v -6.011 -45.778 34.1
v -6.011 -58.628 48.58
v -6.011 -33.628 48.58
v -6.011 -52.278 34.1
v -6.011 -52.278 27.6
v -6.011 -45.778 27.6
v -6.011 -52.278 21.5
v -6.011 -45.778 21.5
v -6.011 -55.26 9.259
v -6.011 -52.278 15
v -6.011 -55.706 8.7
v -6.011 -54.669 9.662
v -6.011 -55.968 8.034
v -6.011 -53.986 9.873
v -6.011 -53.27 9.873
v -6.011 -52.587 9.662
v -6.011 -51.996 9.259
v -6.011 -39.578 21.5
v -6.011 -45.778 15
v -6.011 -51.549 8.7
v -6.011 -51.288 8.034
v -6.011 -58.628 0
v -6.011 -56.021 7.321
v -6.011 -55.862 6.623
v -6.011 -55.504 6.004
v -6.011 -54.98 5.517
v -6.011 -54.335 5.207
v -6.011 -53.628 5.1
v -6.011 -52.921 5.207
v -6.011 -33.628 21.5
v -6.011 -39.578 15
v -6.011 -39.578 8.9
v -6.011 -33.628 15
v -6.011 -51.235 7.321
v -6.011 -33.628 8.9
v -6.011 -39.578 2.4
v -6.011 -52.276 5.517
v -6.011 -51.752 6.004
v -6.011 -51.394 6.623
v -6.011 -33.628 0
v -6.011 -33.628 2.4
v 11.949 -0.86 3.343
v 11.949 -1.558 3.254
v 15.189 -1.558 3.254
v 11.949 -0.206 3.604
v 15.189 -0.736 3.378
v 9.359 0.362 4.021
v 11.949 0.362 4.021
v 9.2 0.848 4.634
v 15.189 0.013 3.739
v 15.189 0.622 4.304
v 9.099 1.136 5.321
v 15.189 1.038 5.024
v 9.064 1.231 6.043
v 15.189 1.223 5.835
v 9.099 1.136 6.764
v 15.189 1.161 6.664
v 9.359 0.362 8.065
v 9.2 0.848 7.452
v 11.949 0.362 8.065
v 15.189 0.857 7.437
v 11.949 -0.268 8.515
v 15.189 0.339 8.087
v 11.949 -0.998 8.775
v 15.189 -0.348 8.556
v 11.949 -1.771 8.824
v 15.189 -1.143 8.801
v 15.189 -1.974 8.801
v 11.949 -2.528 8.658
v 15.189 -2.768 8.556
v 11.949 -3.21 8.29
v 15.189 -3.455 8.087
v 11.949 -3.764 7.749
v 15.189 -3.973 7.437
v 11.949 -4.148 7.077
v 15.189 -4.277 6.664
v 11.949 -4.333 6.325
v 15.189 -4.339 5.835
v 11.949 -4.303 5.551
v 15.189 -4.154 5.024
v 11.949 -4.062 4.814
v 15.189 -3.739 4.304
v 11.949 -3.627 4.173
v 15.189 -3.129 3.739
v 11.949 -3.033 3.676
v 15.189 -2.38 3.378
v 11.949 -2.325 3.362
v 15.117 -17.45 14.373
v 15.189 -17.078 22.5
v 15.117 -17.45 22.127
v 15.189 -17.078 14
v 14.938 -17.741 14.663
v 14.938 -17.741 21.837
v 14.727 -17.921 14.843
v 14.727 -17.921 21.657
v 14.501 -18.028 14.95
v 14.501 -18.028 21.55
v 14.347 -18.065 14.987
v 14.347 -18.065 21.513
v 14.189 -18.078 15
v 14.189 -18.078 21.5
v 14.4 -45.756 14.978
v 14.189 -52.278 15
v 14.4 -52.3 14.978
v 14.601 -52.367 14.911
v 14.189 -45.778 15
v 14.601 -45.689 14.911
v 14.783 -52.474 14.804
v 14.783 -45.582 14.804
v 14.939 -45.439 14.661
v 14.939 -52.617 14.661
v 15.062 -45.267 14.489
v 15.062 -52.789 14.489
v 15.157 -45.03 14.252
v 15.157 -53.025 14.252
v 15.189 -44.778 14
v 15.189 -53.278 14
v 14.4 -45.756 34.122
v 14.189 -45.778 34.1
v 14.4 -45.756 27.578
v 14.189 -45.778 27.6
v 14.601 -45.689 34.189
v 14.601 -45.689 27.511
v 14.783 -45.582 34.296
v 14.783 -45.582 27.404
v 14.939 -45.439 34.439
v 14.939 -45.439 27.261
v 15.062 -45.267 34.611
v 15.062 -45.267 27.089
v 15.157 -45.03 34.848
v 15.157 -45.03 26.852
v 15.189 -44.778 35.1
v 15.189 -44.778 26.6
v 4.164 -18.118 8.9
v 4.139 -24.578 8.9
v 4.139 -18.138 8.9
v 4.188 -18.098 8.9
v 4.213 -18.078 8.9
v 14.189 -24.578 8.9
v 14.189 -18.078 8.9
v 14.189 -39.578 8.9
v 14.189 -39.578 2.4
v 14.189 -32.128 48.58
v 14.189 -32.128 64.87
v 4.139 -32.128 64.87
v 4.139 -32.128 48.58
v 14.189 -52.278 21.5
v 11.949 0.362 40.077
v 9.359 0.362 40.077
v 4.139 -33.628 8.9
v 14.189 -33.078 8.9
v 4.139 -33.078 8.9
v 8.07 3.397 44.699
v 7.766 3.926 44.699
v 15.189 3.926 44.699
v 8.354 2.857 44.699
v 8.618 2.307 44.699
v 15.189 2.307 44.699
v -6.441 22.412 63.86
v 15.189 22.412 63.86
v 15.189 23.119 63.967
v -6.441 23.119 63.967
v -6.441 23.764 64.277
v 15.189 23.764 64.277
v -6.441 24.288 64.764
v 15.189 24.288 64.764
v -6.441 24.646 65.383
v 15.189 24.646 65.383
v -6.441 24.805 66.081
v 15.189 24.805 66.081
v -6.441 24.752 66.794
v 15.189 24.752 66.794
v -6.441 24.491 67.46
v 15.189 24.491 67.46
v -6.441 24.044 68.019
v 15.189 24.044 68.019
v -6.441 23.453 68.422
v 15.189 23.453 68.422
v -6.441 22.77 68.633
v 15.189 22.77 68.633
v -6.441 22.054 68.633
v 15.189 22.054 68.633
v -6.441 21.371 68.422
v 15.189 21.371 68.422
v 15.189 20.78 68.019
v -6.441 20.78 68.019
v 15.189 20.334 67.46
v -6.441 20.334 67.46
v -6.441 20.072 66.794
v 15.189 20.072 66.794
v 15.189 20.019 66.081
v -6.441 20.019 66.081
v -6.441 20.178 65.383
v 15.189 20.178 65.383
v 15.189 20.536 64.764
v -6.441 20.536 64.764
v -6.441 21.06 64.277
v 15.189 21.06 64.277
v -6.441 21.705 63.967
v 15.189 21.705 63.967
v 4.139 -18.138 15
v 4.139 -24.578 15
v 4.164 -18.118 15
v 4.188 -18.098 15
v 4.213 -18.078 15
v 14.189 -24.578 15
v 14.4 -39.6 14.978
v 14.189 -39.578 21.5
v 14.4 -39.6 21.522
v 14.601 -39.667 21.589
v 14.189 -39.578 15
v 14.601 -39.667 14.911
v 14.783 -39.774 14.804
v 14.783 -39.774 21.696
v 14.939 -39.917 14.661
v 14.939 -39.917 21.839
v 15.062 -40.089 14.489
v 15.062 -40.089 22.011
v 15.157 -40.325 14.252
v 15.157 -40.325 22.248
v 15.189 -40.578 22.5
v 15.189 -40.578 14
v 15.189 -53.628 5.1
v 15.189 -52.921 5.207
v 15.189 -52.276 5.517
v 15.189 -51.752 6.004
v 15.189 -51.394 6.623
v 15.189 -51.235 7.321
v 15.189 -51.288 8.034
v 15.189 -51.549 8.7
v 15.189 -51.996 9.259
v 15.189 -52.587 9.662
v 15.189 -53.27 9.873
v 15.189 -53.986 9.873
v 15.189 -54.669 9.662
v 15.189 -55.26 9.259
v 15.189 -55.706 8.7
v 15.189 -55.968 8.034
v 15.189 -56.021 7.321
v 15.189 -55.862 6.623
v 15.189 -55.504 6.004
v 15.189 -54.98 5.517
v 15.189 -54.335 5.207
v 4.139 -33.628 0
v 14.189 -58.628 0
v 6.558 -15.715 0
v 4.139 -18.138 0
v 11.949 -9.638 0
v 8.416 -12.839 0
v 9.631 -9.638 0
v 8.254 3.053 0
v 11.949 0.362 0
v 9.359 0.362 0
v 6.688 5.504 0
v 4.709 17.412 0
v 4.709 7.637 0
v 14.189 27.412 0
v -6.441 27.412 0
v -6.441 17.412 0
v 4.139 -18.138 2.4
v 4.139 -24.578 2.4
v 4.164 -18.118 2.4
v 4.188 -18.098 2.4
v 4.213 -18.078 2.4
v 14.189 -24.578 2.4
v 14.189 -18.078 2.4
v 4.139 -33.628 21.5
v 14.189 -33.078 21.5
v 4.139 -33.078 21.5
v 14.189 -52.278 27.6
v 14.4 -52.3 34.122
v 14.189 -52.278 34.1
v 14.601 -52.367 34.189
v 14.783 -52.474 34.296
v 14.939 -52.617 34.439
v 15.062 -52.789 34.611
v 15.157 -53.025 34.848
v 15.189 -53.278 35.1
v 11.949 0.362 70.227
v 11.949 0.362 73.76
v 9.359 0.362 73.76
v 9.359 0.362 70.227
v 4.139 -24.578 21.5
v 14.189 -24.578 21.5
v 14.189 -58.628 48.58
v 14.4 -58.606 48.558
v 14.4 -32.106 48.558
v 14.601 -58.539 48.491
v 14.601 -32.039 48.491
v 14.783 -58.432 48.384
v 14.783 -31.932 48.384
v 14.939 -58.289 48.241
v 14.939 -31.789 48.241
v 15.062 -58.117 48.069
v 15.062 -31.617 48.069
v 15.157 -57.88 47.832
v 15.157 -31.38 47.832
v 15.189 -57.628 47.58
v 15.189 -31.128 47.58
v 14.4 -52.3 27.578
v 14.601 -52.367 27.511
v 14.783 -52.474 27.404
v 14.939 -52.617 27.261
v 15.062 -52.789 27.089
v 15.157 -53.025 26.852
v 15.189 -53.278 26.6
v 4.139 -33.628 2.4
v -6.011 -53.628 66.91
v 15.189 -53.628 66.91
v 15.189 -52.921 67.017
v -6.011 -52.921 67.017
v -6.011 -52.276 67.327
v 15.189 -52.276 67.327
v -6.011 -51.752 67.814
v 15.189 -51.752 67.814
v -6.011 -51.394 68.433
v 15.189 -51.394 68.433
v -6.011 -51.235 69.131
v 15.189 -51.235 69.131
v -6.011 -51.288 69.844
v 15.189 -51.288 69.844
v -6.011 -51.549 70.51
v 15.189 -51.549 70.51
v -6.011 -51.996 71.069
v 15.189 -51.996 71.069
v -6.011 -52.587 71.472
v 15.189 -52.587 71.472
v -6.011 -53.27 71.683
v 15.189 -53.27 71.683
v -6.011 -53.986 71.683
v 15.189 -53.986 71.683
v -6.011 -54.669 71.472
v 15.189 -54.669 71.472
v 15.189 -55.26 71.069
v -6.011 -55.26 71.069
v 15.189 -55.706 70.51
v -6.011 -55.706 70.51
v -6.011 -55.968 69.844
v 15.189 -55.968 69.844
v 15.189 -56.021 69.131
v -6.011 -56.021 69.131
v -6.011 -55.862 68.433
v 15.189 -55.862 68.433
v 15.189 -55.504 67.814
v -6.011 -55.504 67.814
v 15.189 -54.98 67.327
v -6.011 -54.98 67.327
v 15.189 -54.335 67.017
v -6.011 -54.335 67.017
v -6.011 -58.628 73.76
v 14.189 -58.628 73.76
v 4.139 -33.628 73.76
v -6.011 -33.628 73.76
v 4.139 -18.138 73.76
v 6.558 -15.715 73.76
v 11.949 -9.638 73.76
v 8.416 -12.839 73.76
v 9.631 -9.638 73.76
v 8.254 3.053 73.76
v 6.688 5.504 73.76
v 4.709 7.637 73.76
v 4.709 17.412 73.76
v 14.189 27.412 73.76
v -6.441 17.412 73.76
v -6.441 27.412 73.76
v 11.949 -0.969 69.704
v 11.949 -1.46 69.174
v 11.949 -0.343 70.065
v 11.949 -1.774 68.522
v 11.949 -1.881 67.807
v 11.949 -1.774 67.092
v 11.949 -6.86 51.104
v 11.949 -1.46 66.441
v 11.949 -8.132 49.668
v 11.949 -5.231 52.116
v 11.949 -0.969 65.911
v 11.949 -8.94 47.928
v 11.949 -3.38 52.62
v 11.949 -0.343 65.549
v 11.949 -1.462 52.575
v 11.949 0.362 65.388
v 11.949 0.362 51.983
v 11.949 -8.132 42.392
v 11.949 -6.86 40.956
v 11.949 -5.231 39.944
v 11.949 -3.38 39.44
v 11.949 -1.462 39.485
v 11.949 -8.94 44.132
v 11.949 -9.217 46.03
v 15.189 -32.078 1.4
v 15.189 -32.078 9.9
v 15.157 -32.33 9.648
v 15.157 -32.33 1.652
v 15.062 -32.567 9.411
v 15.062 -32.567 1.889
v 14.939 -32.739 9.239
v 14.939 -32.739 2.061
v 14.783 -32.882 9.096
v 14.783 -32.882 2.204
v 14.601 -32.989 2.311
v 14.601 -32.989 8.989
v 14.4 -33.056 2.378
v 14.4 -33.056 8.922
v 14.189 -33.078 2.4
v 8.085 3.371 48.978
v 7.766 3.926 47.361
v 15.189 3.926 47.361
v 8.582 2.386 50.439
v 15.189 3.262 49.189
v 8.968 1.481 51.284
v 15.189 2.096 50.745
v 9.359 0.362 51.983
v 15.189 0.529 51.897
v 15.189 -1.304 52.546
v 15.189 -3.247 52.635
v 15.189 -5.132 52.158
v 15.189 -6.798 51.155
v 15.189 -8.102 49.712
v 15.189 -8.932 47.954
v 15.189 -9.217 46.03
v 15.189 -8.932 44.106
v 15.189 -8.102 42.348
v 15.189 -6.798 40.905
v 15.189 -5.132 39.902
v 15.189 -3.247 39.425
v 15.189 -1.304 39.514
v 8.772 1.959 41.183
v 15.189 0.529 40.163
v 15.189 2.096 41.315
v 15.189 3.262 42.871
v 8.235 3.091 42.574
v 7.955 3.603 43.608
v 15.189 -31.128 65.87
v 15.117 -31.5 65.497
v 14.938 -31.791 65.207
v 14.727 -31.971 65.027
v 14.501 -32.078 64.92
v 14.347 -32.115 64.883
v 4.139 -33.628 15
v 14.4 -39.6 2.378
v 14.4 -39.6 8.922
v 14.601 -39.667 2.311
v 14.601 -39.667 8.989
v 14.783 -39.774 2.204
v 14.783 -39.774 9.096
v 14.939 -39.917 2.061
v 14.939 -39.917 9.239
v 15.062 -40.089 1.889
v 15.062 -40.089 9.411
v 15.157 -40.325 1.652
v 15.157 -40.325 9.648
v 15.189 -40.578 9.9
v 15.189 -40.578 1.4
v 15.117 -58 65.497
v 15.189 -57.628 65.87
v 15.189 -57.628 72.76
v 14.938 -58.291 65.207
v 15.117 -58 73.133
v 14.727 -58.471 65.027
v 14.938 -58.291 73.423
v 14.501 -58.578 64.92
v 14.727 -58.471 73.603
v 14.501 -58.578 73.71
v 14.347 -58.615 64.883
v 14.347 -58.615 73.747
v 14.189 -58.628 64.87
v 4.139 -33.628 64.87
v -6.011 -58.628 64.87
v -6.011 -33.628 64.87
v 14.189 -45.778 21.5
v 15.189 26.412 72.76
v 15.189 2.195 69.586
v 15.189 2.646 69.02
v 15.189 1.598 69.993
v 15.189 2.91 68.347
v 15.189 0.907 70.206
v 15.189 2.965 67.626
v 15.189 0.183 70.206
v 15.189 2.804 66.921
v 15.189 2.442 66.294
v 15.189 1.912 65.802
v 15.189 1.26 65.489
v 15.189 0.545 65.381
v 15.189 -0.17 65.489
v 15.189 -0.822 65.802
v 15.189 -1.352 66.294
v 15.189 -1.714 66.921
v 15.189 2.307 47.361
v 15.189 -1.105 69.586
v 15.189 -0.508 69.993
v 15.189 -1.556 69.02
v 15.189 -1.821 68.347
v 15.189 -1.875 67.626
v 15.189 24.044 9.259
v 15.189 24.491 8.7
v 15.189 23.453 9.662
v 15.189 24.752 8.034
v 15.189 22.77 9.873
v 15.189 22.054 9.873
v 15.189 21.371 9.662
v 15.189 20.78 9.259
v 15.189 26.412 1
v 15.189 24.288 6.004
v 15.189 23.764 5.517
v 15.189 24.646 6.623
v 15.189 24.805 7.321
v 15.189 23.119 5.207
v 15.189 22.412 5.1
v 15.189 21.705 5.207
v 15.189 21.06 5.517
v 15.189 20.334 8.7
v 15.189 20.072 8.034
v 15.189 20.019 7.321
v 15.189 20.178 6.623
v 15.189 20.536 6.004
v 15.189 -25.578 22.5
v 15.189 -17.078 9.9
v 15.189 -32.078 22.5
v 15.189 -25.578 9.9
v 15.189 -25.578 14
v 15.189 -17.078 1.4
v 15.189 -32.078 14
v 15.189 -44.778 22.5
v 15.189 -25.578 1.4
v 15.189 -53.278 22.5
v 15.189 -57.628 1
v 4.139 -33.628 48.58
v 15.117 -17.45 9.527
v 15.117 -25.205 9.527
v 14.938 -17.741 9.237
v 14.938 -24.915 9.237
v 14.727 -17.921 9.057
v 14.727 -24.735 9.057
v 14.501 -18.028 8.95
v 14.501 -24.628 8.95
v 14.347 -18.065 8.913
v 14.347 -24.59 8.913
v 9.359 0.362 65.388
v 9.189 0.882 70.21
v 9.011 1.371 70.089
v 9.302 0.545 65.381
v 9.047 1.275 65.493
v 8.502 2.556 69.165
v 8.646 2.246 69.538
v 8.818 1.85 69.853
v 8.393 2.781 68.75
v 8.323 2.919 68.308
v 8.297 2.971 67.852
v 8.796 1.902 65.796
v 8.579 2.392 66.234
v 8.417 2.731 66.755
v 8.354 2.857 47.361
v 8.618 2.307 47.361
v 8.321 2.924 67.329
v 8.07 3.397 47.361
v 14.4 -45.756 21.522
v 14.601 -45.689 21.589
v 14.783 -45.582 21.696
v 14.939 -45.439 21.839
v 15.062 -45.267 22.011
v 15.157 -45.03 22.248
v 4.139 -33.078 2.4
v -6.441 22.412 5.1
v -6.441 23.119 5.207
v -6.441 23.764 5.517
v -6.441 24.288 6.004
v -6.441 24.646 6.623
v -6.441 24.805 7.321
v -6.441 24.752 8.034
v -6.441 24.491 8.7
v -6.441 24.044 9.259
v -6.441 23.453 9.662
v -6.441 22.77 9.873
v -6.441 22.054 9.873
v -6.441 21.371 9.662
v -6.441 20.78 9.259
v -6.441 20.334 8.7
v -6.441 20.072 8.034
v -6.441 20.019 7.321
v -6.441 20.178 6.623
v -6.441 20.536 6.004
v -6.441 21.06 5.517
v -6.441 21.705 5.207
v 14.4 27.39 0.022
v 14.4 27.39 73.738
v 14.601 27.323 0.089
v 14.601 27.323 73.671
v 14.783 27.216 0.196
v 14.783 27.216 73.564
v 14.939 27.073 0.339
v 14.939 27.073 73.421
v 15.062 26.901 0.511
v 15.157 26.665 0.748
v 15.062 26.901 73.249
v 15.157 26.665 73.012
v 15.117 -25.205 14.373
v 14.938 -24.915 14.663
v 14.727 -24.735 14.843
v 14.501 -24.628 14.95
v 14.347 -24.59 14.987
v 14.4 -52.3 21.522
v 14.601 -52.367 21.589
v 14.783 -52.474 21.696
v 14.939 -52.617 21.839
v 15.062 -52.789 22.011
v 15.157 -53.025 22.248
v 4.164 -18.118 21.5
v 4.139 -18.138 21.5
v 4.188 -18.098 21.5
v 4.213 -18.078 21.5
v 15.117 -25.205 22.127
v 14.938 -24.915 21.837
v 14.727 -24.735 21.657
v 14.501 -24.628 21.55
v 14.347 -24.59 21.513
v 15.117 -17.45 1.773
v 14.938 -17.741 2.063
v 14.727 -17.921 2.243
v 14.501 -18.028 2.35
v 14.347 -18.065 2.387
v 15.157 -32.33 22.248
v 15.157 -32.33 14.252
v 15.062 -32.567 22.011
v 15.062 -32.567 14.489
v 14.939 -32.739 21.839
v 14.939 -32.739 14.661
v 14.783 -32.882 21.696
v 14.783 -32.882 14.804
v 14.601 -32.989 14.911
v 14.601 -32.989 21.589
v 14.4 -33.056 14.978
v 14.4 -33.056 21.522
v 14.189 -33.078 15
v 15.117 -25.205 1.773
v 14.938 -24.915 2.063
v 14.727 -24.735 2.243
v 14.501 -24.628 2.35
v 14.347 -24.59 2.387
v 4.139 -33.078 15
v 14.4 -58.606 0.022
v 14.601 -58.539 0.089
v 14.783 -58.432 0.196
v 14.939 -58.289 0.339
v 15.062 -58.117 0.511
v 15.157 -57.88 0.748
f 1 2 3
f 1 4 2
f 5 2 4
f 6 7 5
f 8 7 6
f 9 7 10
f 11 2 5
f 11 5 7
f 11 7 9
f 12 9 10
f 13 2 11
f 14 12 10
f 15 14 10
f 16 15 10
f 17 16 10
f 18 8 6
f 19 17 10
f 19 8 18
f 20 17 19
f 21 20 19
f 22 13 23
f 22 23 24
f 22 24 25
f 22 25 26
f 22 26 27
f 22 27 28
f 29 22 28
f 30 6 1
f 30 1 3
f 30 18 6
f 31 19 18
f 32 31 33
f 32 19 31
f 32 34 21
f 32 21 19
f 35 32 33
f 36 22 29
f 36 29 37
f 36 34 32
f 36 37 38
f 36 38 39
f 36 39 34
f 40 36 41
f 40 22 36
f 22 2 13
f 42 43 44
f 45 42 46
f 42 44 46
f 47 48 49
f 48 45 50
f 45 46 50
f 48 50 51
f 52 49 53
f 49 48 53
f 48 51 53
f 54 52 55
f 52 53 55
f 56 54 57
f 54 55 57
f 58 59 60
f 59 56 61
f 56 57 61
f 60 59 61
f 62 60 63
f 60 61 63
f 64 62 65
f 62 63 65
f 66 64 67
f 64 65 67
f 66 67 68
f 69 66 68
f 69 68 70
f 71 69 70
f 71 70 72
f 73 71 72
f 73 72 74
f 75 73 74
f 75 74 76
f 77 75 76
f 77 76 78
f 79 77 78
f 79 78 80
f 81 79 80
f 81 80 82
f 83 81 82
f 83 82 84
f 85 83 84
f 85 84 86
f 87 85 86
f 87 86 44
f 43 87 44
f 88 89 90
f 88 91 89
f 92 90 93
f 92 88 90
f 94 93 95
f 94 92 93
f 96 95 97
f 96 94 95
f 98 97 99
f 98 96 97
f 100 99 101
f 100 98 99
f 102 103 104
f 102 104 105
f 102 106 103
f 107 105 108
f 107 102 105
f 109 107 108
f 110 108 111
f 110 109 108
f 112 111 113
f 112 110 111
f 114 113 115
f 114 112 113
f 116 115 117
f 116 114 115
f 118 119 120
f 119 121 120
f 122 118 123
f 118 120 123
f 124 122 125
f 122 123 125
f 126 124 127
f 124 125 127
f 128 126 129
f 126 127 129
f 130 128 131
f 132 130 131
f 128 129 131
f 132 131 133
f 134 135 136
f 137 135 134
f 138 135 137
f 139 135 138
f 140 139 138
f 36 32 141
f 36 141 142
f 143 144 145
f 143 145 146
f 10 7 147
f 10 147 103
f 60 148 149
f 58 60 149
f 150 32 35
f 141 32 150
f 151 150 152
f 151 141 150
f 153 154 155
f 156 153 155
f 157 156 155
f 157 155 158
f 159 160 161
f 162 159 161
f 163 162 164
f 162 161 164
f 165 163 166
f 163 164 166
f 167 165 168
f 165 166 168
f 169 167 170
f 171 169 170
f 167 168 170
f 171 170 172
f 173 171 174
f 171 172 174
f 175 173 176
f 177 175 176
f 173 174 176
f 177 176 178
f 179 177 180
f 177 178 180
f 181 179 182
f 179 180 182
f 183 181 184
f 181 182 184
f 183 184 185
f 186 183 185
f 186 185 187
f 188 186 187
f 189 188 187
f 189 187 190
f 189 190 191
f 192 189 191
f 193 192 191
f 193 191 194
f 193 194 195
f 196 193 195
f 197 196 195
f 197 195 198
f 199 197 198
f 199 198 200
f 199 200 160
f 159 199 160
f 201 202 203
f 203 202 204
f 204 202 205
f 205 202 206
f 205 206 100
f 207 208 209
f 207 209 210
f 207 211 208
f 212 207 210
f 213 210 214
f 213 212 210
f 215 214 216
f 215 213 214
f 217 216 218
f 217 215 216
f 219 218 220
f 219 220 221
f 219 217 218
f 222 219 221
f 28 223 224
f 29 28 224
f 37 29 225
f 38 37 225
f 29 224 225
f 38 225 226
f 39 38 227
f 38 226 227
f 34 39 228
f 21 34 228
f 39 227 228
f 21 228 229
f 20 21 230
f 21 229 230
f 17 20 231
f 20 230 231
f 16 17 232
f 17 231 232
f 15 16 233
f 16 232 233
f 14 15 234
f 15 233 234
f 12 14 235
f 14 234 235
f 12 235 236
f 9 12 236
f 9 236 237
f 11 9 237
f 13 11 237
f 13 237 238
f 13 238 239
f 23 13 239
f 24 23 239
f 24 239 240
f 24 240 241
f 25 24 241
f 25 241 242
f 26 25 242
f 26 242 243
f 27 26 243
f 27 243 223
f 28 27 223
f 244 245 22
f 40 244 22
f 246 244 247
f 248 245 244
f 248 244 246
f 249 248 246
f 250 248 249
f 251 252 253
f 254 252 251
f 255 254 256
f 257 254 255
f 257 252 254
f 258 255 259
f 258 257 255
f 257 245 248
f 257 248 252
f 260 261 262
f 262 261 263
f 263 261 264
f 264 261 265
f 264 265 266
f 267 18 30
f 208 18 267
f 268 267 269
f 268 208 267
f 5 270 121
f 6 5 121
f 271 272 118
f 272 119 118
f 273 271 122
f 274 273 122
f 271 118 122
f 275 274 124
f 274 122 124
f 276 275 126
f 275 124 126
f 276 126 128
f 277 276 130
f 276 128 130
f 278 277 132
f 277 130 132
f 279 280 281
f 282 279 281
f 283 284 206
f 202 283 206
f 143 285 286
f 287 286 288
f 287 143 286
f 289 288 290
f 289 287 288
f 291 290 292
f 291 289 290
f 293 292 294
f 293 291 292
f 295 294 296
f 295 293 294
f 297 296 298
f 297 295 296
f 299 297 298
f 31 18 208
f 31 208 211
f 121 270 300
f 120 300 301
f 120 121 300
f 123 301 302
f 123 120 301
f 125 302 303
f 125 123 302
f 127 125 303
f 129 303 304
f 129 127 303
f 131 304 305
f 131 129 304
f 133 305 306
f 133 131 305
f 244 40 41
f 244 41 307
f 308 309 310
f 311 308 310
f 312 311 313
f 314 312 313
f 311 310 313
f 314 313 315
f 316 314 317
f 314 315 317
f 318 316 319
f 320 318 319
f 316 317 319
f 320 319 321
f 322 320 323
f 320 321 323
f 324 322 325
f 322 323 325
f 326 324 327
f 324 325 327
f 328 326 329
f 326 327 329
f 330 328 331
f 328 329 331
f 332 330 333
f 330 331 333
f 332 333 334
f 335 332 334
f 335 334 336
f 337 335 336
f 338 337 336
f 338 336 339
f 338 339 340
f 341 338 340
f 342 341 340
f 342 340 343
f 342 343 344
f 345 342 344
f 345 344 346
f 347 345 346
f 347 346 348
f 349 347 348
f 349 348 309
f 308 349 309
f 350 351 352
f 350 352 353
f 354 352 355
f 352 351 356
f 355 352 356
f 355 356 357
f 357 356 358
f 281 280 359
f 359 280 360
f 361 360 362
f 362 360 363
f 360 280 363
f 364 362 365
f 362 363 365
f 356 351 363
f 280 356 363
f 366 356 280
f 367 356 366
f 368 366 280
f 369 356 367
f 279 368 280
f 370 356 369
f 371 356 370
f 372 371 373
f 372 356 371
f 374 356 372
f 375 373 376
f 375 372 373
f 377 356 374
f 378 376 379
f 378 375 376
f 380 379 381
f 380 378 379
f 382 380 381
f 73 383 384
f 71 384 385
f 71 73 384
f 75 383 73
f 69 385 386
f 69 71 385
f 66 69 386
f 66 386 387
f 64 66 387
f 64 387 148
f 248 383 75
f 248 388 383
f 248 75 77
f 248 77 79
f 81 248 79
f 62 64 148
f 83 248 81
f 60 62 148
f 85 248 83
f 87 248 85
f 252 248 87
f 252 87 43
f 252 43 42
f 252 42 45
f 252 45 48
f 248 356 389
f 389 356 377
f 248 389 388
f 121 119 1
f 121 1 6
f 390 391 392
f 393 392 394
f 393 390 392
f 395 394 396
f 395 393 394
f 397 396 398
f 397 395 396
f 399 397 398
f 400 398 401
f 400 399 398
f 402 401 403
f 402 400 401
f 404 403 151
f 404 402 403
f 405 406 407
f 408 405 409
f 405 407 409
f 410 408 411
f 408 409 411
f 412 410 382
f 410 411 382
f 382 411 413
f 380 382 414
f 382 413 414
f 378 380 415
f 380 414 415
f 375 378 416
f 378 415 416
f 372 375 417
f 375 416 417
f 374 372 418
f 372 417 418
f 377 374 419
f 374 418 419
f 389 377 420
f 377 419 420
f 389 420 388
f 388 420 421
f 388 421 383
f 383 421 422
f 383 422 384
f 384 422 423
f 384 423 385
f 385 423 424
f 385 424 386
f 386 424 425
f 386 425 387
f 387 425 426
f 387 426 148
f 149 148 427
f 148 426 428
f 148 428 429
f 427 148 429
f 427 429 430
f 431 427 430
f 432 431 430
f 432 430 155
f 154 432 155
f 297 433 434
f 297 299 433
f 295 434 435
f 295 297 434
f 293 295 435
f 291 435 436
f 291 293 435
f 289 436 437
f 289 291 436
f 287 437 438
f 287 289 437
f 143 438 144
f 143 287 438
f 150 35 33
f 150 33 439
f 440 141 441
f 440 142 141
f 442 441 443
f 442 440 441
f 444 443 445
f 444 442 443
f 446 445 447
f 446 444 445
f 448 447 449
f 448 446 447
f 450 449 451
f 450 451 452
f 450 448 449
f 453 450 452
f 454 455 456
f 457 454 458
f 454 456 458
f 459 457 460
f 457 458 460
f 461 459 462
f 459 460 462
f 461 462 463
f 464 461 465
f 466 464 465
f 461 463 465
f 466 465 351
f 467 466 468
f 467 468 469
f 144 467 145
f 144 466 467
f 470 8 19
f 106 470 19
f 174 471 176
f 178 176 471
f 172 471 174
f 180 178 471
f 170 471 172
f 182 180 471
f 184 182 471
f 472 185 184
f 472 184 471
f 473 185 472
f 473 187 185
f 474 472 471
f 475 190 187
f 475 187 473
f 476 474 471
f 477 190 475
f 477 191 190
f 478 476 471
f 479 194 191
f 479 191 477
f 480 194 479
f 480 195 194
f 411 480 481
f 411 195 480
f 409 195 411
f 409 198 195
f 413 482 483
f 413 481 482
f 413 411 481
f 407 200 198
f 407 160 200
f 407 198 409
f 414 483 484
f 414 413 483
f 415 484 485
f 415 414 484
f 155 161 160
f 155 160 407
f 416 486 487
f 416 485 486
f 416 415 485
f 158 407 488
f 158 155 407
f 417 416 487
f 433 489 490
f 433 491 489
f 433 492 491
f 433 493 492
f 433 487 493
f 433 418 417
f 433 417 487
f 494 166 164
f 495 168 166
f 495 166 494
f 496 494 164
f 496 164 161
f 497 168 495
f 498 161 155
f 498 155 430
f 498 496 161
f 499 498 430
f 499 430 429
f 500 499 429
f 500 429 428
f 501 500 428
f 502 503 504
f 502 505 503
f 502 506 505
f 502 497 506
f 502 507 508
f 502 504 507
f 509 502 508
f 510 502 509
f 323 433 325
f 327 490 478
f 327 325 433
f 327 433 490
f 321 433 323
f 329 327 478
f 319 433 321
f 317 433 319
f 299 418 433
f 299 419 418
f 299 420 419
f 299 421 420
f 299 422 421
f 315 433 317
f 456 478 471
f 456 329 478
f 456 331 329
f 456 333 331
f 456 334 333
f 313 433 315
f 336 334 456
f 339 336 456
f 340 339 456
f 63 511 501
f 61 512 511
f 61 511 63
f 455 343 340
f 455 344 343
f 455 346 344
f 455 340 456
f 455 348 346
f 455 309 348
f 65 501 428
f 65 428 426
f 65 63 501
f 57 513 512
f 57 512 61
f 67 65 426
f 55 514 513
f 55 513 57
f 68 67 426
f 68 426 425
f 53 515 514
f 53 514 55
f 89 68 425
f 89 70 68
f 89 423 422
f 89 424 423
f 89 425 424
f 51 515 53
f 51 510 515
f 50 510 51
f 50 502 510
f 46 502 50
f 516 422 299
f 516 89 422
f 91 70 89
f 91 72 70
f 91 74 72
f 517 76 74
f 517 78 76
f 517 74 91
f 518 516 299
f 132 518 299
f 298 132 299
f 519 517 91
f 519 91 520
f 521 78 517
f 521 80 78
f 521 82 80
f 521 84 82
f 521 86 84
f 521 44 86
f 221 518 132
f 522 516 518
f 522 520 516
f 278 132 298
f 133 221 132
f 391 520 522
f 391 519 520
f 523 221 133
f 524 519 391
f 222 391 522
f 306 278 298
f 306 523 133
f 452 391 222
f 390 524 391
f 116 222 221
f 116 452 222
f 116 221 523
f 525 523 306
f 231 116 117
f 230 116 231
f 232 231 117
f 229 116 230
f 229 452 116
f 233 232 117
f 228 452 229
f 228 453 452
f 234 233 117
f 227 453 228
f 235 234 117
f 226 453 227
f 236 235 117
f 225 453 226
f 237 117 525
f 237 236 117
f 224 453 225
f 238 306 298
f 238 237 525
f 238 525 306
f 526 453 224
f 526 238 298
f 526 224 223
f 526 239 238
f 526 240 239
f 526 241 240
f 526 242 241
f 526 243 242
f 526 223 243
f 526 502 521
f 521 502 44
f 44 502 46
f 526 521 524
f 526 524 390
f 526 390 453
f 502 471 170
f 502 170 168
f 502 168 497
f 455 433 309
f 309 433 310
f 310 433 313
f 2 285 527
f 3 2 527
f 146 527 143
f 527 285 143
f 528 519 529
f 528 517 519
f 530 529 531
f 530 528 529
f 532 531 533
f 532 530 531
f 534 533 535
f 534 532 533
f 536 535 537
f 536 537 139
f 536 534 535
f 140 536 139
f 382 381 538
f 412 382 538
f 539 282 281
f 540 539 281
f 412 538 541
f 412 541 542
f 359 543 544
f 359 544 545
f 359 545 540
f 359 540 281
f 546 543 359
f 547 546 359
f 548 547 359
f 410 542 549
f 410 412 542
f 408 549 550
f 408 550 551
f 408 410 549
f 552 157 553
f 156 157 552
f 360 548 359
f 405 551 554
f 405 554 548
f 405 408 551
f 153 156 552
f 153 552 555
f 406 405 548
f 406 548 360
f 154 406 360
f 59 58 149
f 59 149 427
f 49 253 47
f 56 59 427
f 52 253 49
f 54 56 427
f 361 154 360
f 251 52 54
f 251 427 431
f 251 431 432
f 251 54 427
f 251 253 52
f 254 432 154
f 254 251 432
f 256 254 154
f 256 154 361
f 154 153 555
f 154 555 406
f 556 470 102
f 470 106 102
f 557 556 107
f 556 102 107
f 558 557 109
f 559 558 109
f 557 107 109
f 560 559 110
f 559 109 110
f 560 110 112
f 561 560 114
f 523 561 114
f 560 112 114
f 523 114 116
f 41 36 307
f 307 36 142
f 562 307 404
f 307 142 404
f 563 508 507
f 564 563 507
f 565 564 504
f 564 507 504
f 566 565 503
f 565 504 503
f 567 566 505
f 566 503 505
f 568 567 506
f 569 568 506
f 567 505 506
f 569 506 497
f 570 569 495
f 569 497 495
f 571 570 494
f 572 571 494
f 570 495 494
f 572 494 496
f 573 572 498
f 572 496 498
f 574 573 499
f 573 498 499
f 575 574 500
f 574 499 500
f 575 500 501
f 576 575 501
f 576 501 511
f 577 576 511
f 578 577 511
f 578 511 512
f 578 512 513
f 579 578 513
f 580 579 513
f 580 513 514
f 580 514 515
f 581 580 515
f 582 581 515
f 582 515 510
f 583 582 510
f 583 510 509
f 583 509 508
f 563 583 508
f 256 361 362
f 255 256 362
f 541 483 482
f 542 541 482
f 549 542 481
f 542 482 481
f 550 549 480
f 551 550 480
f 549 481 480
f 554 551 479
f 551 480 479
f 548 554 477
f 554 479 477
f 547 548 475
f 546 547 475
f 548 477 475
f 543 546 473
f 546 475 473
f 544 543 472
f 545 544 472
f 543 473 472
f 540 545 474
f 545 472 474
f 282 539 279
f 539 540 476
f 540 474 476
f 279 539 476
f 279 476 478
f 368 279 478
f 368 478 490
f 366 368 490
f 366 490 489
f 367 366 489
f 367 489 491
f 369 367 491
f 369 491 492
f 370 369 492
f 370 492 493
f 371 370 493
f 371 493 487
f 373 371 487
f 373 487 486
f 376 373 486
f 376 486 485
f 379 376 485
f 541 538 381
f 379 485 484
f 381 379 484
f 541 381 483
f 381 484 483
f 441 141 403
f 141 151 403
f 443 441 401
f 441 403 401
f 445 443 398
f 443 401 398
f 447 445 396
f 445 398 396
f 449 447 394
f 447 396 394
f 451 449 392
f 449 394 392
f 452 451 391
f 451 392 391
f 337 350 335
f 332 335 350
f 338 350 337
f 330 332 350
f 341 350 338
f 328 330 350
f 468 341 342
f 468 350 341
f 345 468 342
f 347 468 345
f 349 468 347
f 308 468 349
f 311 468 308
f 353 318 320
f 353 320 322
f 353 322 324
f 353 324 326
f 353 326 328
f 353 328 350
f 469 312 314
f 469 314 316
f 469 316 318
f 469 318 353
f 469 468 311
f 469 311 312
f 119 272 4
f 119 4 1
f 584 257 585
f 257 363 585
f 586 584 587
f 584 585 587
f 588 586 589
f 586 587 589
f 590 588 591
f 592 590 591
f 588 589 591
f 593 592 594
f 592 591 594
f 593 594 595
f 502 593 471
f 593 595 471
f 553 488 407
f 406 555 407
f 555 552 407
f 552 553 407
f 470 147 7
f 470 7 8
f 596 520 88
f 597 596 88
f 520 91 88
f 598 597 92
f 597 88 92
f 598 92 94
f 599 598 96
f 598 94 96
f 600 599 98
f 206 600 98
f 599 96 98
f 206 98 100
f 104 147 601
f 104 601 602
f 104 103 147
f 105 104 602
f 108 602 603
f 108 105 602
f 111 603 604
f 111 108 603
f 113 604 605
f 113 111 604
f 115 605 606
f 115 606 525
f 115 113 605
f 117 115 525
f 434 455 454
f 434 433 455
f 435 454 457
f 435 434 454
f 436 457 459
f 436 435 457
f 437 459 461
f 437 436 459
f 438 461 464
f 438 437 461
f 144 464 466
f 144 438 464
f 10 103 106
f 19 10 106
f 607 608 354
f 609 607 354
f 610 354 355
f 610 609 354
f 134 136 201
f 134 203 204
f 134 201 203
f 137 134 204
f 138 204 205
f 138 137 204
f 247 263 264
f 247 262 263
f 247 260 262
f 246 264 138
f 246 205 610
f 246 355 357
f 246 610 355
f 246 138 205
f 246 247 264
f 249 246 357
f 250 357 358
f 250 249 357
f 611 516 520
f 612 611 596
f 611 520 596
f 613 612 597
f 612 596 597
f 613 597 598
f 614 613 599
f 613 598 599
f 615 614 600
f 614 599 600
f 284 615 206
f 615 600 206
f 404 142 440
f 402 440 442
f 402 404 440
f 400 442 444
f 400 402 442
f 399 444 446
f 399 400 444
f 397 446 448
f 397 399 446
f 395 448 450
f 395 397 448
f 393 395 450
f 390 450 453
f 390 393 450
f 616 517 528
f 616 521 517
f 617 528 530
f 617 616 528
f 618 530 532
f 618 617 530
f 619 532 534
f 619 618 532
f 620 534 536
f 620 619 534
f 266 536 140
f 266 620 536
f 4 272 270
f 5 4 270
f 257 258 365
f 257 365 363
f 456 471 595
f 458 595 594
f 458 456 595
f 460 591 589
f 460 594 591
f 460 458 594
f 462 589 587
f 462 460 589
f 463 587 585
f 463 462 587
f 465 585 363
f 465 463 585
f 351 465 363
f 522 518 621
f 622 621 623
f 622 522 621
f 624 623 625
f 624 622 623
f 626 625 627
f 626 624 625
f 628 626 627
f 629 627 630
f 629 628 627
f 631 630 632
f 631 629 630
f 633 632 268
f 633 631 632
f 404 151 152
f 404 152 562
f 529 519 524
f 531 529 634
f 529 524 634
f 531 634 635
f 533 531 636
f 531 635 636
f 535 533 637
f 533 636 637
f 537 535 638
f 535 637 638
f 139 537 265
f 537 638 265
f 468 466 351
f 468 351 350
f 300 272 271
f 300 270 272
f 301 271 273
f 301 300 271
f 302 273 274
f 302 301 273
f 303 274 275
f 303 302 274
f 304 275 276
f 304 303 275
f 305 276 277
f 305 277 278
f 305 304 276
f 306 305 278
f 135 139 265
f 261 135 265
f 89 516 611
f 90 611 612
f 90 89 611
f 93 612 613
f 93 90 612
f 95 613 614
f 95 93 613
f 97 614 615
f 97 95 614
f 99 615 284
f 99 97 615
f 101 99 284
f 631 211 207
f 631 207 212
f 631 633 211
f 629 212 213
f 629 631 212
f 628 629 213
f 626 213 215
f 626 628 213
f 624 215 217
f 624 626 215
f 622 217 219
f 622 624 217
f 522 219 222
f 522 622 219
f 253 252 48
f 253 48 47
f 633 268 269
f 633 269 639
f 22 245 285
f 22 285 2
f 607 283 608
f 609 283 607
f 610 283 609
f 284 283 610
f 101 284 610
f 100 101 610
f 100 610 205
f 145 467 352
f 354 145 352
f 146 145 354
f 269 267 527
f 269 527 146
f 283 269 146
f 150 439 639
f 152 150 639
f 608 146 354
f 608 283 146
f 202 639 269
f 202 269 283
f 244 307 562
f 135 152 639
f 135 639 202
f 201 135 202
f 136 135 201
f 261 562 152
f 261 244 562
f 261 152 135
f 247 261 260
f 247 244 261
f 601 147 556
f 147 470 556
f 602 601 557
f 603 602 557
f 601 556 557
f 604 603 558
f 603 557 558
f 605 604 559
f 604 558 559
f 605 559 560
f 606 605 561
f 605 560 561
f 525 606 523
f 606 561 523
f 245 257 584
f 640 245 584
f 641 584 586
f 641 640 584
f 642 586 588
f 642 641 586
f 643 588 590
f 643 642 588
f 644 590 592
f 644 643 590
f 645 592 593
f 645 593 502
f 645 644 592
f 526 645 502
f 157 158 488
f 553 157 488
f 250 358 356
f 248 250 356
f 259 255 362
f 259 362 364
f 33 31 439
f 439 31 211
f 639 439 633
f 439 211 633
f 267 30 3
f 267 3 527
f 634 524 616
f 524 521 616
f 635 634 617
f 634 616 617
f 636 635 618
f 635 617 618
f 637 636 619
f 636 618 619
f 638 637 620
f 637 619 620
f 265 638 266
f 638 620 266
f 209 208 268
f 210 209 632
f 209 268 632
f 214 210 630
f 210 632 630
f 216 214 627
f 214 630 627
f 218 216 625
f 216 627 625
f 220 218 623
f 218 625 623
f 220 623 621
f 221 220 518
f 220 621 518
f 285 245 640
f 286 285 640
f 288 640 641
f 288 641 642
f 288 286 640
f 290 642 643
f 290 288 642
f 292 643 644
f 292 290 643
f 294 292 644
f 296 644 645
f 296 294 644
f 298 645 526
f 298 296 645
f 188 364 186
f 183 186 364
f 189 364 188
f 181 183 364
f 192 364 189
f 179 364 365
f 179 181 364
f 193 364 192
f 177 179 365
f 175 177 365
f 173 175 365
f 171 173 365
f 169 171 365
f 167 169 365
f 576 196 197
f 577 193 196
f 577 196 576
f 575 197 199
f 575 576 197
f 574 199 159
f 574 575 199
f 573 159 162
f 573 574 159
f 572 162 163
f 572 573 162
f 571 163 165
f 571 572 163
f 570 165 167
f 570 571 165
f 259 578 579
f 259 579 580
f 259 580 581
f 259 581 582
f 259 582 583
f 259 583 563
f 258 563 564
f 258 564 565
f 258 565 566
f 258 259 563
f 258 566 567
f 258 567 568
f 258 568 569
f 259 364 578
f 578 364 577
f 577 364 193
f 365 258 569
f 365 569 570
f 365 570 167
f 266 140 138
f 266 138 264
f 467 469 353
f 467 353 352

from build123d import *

# Parameters (mm, degrees)
PROFILEEXTRUDE_DEPTH = 73.76
HOSEWINDOW_W         = 16.29
HOSEWINDOW_H         = 26.5
HOSEWINDOWCUT_DEPTH  = 22.63
CAGESCREWS_R         = 2.4
CAGESCREWSCUT_DEPTH  = 22.63
AXLEHOLECUT_DEPTH    = 22.63
SETSCREWS_R          = 2.426338021
SETSCREWS_R_2        = 2.788762315
SETSCREWSCUT_DEPTH   = 22.63
SKETCH1_W            = 6.5
SKETCH1_H            = 6.5
CUT_EXTRUDE1_DEPTH   = 22.63
FILLET1_R            = 1


with BuildPart() as part:
    # Profile → ProfileExtrude (new body)
    with BuildSketch(Plane.XY):
        with BuildLine():
            Line((-6.01073477, -58.62791746), (-6.01073477, -33.62791746))
            Line((-6.01073477, -33.62791746), (4.13926523, -33.62791746))
            Line((4.13926523, -33.62791746), (4.13926523, -18.13791746))
            ThreePointArc((4.13926523, -18.13791746), (7.563334043, -14.326029686), (9.63126523, -9.63791746))
            Line((9.63126523, -9.63791746), (11.94926523, -9.63791746))
            Line((11.94926523, -9.63791746), (11.94926523, 0.36208254))
            Line((11.94926523, 0.36208254), (9.35926523, 0.36208254))
            ThreePointArc((9.35926523, 0.36208254), (7.525939238, 4.313848402), (4.70926523, 7.63708254))
            Line((4.70926523, 7.63708254), (4.70926523, 17.41208254))
            Line((4.70926523, 17.41208254), (-6.44073477, 17.41208254))
            Line((-6.44073477, 17.41208254), (-6.44073477, 27.41208254))
            Line((-6.44073477, 27.41208254), (15.18926523, 27.41208254))
            Line((15.18926523, 27.41208254), (15.18926523, -58.62791746))
            Line((15.18926523, -58.62791746), (-6.01073477, -58.62791746))
        make_face()
    extrude(amount=PROFILEEXTRUDE_DEPTH)

    # HoseWindow → HoseWindowCut (cut, through all)
    with BuildSketch(Plane(origin=(15.18926523, 0, 0), x_dir=(0, 0, -1), z_dir=(1, 0, 0))):
        with Locations((-56.725, -45.37791746)):
            Rectangle(HOSEWINDOW_W, HOSEWINDOW_H)
    extrude(amount=-HOSEWINDOWCUT_DEPTH, mode=Mode.SUBTRACT)

    # CageScrews → CageScrewsCut (cut, through all)
    with BuildSketch(Plane(origin=(15.18926523, 0, 0), x_dir=(0, 0, -1), z_dir=(1, 0, 0))):
        with Locations((-66.26, 22.41208254)):
            Circle(CAGESCREWS_R)
        with Locations((-7.5, 22.41208254)):
            Circle(CAGESCREWS_R)
        with Locations((-7.5, -53.62791746)):
            Circle(CAGESCREWS_R)
        with Locations((-69.31, -53.62791746)):
            Circle(CAGESCREWS_R)
    extrude(amount=-CAGESCREWSCUT_DEPTH, mode=Mode.SUBTRACT)

    # AxleHole → AxleHoleCut (cut, through all)
    with BuildSketch(Plane(origin=(15.18926523, 0, 0), x_dir=(0, 0, -1), z_dir=(1, 0, 0))):
        with BuildLine():
            Line((-44.699, 2.307293484), (-47.361, 2.307293484))
            Line((-47.361, 2.307293484), (-47.361, 3.926293484))
            ThreePointArc((-47.361, 3.926293484), (-46.03, -9.21691746), (-44.699, 3.926293484))
            Line((-44.699, 3.926293484), (-44.699, 2.307293484))
        make_face()
    extrude(amount=-AXLEHOLECUT_DEPTH, mode=Mode.SUBTRACT)

    # SetScrews → SetScrewsCut (cut, through all)
    with BuildSketch(Plane(origin=(15.18926523, 0, 0), x_dir=(0, 0, -1), z_dir=(1, 0, 0))):
        with Locations((-67.80722939, 0.544946624)):
            Circle(SETSCREWS_R)
        with Locations((-6.04299884, -1.55824191)):
            Circle(SETSCREWS_R_2)
    extrude(amount=-SETSCREWSCUT_DEPTH, mode=Mode.SUBTRACT)

    # Sketch1 → Cut-Extrude1 (cut, through all)
    with BuildSketch(Plane(origin=(15.18926523, 0, 0), x_dir=(0, 0, -1), z_dir=(1, 0, 0))):
        with Locations((-18.25, -49.02791746)):
            Rectangle(SKETCH1_W, SKETCH1_H)
        with Locations((-30.85, -49.02791746)):
            Rectangle(SKETCH1_W, SKETCH1_H)
        with Locations((-5.65, -36.32791746)):
            Rectangle(SKETCH1_W, SKETCH1_H)
        with Locations((-18.25, -36.32791746)):
            Rectangle(SKETCH1_W, SKETCH1_H)
        with Locations((-5.65, -21.32791746)):
            Rectangle(SKETCH1_W, SKETCH1_H)
        with Locations((-18.25, -21.32791746)):
            Rectangle(SKETCH1_W, SKETCH1_H)
    extrude(amount=-CUT_EXTRUDE1_DEPTH, mode=Mode.SUBTRACT)

    # Fillet1
    fillet1_edges = [part.edges().sort_by_distance(p)[0] for p in [
        (15.18926523, -45.77791746, 18.25),
        (15.18926523, -49.02791746, 21.5),
        (15.18926523, -52.27791746, 18.25),
        (15.18926523, -49.02791746, 15),
        (15.18926523, -49.02791746, 34.1),
        (15.18926523, -52.27791746, 30.85),
        (15.18926523, -49.02791746, 27.6),
        (15.18926523, -45.77791746, 30.85),
        (15.18926523, -36.32791746, 8.9),
        (15.18926523, -39.57791746, 5.65),
        (15.18926523, -36.32791746, 2.4),
        (15.18926523, -33.07791746, 5.65),
        (15.18926523, -15.60791746, 0),
        (15.18926523, -36.32791746, 21.5),
        (15.18926523, -39.57791746, 18.25),
        (15.18926523, -36.32791746, 15),
        (15.18926523, -33.07791746, 18.25),
        (15.18926523, -21.32791746, 8.9),
        (15.18926523, -24.57791746, 5.65),
        (15.18926523, -21.32791746, 2.4),
        (15.18926523, -18.07791746, 5.65),
        (15.18926523, -58.62791746, 69.315),
        (15.18926523, -21.32791746, 21.5),
        (15.18926523, -24.57791746, 18.25),
        (15.18926523, -21.32791746, 15),
        (15.18926523, -18.07791746, 18.25),
        (15.18926523, 27.41208254, 36.88),
        (15.18926523, -58.62791746, 24.29),
        (15.18926523, -15.60791746, 73.76),
        (15.18926523, -45.37791746, 64.87),
        (15.18926523, -45.37791746, 48.58),
        (15.18926523, -32.12791746, 56.725),
    ]]
    fillet(fillet1_edges, radius=FILLET1_R)


solid = part.part
